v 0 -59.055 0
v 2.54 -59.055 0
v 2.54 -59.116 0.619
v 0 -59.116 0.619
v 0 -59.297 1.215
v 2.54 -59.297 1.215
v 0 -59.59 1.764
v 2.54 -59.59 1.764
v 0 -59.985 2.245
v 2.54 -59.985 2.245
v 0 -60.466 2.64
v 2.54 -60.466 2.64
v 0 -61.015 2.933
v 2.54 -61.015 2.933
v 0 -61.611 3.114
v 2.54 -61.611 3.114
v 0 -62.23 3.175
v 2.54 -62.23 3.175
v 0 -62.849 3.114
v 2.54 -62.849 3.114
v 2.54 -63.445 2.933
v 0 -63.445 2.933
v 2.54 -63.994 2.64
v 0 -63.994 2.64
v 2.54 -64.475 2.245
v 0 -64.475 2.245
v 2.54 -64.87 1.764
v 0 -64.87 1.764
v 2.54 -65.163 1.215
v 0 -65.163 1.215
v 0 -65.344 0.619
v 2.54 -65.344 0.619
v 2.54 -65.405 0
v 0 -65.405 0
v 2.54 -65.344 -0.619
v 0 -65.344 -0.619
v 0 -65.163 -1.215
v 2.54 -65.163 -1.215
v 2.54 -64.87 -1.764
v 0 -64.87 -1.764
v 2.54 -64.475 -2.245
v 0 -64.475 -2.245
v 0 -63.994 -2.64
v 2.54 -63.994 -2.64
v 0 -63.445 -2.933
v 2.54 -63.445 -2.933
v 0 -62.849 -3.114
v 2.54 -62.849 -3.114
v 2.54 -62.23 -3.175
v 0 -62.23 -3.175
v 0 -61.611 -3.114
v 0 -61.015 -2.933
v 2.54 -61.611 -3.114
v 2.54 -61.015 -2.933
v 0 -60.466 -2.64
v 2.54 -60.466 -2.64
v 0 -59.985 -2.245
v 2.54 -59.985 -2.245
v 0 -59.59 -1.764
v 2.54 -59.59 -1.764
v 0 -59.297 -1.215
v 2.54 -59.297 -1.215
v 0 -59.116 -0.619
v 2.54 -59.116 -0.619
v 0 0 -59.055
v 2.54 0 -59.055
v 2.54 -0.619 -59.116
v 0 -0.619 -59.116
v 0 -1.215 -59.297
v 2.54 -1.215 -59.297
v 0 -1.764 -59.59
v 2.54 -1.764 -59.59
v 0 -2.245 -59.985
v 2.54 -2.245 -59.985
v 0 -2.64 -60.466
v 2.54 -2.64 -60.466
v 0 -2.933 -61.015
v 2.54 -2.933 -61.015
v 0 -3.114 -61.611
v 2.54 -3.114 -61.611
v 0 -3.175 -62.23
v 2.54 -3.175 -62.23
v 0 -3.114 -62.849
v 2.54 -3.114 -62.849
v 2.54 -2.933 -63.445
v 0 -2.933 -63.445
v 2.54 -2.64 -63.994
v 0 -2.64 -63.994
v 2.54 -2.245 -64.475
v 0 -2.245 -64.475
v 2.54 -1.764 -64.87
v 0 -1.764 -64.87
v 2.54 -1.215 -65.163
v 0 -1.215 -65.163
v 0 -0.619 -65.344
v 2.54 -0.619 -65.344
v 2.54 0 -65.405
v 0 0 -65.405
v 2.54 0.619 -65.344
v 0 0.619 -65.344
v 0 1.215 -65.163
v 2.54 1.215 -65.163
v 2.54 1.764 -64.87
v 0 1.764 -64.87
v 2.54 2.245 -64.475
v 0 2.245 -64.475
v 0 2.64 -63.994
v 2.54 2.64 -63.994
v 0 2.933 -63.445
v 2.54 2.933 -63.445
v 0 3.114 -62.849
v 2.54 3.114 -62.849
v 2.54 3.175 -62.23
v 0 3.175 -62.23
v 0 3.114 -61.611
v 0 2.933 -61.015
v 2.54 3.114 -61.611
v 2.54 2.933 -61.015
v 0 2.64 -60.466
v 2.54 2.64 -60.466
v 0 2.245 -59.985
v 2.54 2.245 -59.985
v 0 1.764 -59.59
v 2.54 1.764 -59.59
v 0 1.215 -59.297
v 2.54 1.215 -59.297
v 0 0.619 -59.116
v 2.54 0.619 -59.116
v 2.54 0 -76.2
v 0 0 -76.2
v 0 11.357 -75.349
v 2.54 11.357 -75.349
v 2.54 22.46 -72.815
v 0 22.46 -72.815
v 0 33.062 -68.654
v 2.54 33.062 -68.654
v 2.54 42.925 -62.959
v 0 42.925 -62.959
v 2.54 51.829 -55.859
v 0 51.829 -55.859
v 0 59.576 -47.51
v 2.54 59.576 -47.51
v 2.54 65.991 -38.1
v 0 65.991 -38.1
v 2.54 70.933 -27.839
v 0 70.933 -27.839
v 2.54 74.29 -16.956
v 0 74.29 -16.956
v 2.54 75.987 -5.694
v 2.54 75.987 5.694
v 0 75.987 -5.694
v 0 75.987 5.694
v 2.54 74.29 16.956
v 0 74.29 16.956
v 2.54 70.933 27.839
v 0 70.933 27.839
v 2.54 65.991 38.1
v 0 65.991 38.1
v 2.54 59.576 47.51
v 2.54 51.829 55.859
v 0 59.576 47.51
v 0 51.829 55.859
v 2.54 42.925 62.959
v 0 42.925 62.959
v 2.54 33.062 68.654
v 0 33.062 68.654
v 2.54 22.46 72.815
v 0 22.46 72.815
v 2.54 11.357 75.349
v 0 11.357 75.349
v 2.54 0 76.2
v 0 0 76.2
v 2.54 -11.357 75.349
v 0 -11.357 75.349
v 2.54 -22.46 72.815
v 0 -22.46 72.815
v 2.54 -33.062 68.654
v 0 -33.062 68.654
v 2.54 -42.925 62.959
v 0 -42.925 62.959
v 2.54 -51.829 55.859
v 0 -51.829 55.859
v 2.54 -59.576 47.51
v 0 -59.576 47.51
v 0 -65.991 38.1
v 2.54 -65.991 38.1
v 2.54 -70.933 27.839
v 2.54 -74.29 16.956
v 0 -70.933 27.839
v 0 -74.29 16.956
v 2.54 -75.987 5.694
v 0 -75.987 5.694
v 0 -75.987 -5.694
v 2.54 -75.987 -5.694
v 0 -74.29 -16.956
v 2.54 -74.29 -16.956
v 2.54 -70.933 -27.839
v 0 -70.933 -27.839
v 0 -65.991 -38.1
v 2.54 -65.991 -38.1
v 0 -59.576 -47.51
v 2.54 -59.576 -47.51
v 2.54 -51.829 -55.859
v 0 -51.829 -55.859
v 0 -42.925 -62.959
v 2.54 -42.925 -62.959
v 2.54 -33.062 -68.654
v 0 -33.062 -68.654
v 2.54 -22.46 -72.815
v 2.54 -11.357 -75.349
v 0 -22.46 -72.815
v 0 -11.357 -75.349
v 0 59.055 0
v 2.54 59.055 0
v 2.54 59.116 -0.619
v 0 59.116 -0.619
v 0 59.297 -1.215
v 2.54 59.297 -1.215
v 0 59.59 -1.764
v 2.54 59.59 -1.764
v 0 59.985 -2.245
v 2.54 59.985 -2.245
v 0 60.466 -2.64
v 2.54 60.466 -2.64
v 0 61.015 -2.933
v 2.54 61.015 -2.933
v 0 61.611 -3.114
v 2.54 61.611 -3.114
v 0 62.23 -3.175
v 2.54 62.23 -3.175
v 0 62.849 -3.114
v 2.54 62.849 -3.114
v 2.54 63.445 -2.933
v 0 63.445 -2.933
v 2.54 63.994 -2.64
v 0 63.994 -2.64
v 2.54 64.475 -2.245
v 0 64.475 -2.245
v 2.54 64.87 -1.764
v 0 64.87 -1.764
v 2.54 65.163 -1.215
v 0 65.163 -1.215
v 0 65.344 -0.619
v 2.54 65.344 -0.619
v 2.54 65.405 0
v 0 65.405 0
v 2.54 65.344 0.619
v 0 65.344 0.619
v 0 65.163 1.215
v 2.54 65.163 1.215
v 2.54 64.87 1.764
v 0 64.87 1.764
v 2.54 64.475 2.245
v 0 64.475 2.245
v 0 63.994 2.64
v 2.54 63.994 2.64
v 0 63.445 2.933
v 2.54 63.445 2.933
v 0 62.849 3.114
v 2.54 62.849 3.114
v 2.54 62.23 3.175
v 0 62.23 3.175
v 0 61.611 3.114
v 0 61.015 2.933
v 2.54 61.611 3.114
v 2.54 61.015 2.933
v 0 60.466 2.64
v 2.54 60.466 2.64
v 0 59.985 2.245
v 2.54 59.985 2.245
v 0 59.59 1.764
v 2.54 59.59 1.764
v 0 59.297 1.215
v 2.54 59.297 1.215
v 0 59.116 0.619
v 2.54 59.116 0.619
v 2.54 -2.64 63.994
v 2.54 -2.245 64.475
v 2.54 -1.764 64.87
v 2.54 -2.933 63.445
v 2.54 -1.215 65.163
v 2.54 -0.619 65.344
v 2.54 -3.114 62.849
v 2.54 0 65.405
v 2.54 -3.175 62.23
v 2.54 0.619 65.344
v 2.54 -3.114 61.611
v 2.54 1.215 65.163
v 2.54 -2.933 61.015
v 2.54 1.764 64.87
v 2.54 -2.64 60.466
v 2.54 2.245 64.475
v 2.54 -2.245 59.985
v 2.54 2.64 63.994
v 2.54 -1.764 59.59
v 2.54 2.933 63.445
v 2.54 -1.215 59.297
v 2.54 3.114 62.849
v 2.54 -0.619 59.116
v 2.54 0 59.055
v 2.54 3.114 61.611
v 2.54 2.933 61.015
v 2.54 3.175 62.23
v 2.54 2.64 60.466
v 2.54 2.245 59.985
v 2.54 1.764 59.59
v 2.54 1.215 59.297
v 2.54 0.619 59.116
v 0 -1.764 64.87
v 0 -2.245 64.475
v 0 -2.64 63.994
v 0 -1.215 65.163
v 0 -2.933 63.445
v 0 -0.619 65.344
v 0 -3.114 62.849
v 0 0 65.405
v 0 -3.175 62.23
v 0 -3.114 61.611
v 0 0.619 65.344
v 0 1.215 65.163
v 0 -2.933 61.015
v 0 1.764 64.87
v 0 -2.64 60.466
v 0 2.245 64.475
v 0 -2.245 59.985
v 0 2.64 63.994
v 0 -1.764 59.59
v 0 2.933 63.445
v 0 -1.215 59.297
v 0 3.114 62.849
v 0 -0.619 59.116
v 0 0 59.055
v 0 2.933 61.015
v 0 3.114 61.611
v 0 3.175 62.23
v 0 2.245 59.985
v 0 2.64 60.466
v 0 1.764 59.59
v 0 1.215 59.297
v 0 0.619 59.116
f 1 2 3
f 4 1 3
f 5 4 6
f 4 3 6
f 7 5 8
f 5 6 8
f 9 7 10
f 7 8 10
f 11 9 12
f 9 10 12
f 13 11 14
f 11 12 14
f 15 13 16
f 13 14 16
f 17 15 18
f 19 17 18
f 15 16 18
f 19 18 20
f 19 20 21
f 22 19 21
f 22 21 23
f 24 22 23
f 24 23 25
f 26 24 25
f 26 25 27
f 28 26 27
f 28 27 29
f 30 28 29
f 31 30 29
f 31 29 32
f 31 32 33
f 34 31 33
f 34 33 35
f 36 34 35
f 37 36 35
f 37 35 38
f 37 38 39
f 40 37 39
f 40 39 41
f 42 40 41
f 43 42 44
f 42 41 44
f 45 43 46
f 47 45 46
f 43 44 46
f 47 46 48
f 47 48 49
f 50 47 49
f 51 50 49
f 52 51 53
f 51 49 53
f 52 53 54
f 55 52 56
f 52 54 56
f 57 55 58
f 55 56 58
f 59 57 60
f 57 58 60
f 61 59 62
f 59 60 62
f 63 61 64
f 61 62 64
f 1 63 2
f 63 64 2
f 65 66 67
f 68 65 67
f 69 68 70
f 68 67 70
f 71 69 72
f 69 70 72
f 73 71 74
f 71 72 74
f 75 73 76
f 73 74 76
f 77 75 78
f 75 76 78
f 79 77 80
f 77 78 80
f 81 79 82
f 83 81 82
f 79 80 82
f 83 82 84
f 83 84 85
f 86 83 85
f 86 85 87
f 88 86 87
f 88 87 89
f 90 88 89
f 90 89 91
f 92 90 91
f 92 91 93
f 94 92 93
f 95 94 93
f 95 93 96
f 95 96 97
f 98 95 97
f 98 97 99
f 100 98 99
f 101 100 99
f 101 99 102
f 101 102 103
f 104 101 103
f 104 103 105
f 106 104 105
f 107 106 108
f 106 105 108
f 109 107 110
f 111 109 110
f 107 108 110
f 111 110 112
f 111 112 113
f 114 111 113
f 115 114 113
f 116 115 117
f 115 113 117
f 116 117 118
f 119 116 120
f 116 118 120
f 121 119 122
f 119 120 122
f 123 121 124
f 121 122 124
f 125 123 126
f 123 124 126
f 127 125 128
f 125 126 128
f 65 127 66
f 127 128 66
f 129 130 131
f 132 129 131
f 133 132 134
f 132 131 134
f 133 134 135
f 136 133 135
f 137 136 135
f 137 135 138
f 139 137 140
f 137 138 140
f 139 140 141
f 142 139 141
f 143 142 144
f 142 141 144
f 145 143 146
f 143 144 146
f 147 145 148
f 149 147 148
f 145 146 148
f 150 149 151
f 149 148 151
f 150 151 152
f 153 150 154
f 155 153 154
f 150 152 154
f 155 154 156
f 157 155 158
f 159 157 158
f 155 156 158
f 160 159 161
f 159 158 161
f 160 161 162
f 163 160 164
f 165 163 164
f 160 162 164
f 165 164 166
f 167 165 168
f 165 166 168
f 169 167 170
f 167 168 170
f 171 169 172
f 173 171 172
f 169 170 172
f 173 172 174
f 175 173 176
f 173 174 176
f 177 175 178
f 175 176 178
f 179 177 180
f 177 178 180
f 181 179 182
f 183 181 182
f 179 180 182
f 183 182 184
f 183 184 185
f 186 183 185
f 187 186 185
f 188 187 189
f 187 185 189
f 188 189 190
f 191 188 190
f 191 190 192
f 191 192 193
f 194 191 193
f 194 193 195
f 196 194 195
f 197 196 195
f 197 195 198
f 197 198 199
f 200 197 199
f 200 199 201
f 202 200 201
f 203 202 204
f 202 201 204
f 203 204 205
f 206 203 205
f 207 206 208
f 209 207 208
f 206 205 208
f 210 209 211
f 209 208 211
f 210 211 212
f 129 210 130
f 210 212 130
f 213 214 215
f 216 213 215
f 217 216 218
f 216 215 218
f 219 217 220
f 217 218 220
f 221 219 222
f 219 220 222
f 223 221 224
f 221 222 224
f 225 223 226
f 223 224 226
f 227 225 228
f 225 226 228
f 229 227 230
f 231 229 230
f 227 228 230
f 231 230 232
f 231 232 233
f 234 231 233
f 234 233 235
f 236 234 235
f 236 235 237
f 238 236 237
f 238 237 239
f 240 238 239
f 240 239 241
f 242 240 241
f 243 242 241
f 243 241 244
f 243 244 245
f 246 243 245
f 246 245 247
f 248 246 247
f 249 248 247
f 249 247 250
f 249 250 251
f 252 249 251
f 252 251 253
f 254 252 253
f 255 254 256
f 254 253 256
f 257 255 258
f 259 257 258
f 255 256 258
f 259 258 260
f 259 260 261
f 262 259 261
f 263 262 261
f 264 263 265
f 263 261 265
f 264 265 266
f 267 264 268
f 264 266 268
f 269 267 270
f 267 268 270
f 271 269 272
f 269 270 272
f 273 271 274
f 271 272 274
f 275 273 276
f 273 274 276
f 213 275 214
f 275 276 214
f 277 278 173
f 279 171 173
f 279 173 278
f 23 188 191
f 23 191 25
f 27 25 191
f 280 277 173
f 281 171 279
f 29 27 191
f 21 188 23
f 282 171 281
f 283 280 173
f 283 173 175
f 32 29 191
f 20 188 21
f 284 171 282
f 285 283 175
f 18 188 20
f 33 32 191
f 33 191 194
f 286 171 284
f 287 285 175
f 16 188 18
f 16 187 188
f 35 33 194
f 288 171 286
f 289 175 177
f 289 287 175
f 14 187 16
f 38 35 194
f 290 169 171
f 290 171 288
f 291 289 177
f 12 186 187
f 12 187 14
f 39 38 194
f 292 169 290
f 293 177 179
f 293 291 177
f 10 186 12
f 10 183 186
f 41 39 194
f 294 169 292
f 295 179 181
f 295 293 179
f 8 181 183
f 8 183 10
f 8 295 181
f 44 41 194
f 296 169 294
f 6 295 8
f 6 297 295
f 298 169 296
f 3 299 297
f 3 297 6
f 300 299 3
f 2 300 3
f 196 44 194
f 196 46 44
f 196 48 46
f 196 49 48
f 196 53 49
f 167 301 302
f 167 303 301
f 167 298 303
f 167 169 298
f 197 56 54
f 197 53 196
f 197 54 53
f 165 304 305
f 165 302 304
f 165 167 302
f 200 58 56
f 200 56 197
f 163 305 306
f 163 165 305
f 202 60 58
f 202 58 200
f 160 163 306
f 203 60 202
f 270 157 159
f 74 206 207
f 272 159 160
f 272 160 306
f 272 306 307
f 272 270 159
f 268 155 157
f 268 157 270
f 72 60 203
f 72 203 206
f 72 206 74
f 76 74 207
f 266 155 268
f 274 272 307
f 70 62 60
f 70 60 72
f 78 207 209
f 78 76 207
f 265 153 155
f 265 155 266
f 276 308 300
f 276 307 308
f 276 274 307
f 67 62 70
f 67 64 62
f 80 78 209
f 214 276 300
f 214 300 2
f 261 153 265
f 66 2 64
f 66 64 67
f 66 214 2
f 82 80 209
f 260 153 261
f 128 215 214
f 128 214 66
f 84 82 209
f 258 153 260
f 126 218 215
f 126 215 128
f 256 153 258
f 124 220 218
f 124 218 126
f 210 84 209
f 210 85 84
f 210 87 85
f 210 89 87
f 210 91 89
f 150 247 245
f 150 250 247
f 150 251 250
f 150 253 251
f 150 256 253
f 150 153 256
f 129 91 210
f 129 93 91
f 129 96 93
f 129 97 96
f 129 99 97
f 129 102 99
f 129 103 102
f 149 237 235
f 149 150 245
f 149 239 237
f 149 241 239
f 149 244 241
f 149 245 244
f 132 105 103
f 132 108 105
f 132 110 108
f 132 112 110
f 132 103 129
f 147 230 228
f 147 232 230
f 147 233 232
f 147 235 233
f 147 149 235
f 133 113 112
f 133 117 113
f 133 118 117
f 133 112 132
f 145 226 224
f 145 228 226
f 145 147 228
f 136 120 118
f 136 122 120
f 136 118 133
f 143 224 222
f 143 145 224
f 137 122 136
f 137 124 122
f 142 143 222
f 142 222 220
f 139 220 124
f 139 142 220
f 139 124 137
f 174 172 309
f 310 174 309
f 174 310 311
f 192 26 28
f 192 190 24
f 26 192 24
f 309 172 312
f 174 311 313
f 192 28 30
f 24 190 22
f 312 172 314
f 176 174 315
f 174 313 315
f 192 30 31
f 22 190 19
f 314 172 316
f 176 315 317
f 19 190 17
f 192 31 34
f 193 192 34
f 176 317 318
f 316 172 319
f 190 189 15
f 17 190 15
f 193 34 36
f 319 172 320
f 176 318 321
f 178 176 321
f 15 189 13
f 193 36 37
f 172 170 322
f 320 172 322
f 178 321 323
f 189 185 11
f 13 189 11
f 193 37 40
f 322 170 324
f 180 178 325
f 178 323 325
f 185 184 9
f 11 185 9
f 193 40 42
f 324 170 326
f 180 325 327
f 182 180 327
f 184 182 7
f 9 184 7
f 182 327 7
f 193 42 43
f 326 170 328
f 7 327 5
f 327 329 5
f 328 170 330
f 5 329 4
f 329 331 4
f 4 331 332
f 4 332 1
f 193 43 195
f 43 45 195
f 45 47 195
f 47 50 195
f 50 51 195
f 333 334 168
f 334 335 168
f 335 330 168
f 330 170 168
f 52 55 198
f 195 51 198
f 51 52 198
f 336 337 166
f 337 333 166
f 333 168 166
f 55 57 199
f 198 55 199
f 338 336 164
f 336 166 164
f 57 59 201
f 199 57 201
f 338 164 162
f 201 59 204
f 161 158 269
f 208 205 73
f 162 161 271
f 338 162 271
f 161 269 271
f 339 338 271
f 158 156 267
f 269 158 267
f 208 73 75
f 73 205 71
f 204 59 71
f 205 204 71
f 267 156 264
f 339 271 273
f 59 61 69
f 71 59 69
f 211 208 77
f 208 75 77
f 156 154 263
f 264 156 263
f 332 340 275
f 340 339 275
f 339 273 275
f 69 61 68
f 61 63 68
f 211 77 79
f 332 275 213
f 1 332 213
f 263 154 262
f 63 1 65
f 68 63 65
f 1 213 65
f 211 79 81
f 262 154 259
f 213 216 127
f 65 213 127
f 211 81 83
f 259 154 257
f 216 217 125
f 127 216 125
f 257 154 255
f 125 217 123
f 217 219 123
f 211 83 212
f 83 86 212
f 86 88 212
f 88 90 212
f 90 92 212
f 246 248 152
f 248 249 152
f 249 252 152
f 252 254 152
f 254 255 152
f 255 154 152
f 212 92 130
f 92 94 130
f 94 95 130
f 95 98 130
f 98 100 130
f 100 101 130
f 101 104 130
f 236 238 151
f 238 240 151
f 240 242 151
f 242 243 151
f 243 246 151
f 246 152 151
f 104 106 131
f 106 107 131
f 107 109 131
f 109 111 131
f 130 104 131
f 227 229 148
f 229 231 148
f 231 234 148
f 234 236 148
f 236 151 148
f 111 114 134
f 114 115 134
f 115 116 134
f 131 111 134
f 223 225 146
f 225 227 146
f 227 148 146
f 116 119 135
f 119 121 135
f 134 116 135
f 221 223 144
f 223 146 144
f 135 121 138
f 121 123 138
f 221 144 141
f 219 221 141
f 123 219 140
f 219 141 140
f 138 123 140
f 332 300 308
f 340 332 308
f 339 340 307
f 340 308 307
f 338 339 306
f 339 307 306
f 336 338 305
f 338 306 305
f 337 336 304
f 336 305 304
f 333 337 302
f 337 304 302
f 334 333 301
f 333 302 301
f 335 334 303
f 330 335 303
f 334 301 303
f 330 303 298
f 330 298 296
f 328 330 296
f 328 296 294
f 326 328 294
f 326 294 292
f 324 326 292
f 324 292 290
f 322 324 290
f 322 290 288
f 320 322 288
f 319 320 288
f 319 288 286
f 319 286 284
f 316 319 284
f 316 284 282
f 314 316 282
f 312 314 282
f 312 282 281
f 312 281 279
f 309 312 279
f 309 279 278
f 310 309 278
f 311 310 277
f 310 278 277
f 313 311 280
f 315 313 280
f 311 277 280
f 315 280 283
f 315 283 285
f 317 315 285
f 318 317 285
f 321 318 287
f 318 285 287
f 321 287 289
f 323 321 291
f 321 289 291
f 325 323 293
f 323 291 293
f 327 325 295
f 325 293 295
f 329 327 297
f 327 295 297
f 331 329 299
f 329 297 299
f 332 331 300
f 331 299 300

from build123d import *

# Parameters (mm, degrees)
SKETCH1_R           = 76.2
BOSS_EXTRUDE1_DEPTH = 2.54
SKETCH2_R           = 3.175
CUT_EXTRUDE2_DEPTH  = 108.793003484
CIRPATTERN2_COUNT   = 4


with BuildPart() as part:
    # Sketch1 → Boss-Extrude1 (new body)
    with BuildSketch(Plane.YZ):
        with Locations(Location((0, 0, 0), (0, 0, 270))):
            Circle(SKETCH1_R)
    extrude(amount=BOSS_EXTRUDE1_DEPTH)

    # Sketch2 → Cut-Extrude2 (cut, through all)
    with BuildSketch(Plane(origin=(2.54, 0, 0), x_dir=(0, 0, -1), z_dir=(1, 0, 0))):
        with Locations((-62.23, 0)):
            Circle(SKETCH2_R)
    cut_extrude2 = extrude(amount=-CUT_EXTRUDE2_DEPTH, mode=Mode.SUBTRACT)

    # CirPattern2: Cut-Extrude2 ×4 about axis
    cirpattern2_axis = Axis((0, 0, 0), (1, 0, 0))
    for i in range(1, CIRPATTERN2_COUNT):
        add(cut_extrude2.rotate(cirpattern2_axis, i * 360 / CIRPATTERN2_COUNT), mode=Mode.SUBTRACT)


solid = part.part
